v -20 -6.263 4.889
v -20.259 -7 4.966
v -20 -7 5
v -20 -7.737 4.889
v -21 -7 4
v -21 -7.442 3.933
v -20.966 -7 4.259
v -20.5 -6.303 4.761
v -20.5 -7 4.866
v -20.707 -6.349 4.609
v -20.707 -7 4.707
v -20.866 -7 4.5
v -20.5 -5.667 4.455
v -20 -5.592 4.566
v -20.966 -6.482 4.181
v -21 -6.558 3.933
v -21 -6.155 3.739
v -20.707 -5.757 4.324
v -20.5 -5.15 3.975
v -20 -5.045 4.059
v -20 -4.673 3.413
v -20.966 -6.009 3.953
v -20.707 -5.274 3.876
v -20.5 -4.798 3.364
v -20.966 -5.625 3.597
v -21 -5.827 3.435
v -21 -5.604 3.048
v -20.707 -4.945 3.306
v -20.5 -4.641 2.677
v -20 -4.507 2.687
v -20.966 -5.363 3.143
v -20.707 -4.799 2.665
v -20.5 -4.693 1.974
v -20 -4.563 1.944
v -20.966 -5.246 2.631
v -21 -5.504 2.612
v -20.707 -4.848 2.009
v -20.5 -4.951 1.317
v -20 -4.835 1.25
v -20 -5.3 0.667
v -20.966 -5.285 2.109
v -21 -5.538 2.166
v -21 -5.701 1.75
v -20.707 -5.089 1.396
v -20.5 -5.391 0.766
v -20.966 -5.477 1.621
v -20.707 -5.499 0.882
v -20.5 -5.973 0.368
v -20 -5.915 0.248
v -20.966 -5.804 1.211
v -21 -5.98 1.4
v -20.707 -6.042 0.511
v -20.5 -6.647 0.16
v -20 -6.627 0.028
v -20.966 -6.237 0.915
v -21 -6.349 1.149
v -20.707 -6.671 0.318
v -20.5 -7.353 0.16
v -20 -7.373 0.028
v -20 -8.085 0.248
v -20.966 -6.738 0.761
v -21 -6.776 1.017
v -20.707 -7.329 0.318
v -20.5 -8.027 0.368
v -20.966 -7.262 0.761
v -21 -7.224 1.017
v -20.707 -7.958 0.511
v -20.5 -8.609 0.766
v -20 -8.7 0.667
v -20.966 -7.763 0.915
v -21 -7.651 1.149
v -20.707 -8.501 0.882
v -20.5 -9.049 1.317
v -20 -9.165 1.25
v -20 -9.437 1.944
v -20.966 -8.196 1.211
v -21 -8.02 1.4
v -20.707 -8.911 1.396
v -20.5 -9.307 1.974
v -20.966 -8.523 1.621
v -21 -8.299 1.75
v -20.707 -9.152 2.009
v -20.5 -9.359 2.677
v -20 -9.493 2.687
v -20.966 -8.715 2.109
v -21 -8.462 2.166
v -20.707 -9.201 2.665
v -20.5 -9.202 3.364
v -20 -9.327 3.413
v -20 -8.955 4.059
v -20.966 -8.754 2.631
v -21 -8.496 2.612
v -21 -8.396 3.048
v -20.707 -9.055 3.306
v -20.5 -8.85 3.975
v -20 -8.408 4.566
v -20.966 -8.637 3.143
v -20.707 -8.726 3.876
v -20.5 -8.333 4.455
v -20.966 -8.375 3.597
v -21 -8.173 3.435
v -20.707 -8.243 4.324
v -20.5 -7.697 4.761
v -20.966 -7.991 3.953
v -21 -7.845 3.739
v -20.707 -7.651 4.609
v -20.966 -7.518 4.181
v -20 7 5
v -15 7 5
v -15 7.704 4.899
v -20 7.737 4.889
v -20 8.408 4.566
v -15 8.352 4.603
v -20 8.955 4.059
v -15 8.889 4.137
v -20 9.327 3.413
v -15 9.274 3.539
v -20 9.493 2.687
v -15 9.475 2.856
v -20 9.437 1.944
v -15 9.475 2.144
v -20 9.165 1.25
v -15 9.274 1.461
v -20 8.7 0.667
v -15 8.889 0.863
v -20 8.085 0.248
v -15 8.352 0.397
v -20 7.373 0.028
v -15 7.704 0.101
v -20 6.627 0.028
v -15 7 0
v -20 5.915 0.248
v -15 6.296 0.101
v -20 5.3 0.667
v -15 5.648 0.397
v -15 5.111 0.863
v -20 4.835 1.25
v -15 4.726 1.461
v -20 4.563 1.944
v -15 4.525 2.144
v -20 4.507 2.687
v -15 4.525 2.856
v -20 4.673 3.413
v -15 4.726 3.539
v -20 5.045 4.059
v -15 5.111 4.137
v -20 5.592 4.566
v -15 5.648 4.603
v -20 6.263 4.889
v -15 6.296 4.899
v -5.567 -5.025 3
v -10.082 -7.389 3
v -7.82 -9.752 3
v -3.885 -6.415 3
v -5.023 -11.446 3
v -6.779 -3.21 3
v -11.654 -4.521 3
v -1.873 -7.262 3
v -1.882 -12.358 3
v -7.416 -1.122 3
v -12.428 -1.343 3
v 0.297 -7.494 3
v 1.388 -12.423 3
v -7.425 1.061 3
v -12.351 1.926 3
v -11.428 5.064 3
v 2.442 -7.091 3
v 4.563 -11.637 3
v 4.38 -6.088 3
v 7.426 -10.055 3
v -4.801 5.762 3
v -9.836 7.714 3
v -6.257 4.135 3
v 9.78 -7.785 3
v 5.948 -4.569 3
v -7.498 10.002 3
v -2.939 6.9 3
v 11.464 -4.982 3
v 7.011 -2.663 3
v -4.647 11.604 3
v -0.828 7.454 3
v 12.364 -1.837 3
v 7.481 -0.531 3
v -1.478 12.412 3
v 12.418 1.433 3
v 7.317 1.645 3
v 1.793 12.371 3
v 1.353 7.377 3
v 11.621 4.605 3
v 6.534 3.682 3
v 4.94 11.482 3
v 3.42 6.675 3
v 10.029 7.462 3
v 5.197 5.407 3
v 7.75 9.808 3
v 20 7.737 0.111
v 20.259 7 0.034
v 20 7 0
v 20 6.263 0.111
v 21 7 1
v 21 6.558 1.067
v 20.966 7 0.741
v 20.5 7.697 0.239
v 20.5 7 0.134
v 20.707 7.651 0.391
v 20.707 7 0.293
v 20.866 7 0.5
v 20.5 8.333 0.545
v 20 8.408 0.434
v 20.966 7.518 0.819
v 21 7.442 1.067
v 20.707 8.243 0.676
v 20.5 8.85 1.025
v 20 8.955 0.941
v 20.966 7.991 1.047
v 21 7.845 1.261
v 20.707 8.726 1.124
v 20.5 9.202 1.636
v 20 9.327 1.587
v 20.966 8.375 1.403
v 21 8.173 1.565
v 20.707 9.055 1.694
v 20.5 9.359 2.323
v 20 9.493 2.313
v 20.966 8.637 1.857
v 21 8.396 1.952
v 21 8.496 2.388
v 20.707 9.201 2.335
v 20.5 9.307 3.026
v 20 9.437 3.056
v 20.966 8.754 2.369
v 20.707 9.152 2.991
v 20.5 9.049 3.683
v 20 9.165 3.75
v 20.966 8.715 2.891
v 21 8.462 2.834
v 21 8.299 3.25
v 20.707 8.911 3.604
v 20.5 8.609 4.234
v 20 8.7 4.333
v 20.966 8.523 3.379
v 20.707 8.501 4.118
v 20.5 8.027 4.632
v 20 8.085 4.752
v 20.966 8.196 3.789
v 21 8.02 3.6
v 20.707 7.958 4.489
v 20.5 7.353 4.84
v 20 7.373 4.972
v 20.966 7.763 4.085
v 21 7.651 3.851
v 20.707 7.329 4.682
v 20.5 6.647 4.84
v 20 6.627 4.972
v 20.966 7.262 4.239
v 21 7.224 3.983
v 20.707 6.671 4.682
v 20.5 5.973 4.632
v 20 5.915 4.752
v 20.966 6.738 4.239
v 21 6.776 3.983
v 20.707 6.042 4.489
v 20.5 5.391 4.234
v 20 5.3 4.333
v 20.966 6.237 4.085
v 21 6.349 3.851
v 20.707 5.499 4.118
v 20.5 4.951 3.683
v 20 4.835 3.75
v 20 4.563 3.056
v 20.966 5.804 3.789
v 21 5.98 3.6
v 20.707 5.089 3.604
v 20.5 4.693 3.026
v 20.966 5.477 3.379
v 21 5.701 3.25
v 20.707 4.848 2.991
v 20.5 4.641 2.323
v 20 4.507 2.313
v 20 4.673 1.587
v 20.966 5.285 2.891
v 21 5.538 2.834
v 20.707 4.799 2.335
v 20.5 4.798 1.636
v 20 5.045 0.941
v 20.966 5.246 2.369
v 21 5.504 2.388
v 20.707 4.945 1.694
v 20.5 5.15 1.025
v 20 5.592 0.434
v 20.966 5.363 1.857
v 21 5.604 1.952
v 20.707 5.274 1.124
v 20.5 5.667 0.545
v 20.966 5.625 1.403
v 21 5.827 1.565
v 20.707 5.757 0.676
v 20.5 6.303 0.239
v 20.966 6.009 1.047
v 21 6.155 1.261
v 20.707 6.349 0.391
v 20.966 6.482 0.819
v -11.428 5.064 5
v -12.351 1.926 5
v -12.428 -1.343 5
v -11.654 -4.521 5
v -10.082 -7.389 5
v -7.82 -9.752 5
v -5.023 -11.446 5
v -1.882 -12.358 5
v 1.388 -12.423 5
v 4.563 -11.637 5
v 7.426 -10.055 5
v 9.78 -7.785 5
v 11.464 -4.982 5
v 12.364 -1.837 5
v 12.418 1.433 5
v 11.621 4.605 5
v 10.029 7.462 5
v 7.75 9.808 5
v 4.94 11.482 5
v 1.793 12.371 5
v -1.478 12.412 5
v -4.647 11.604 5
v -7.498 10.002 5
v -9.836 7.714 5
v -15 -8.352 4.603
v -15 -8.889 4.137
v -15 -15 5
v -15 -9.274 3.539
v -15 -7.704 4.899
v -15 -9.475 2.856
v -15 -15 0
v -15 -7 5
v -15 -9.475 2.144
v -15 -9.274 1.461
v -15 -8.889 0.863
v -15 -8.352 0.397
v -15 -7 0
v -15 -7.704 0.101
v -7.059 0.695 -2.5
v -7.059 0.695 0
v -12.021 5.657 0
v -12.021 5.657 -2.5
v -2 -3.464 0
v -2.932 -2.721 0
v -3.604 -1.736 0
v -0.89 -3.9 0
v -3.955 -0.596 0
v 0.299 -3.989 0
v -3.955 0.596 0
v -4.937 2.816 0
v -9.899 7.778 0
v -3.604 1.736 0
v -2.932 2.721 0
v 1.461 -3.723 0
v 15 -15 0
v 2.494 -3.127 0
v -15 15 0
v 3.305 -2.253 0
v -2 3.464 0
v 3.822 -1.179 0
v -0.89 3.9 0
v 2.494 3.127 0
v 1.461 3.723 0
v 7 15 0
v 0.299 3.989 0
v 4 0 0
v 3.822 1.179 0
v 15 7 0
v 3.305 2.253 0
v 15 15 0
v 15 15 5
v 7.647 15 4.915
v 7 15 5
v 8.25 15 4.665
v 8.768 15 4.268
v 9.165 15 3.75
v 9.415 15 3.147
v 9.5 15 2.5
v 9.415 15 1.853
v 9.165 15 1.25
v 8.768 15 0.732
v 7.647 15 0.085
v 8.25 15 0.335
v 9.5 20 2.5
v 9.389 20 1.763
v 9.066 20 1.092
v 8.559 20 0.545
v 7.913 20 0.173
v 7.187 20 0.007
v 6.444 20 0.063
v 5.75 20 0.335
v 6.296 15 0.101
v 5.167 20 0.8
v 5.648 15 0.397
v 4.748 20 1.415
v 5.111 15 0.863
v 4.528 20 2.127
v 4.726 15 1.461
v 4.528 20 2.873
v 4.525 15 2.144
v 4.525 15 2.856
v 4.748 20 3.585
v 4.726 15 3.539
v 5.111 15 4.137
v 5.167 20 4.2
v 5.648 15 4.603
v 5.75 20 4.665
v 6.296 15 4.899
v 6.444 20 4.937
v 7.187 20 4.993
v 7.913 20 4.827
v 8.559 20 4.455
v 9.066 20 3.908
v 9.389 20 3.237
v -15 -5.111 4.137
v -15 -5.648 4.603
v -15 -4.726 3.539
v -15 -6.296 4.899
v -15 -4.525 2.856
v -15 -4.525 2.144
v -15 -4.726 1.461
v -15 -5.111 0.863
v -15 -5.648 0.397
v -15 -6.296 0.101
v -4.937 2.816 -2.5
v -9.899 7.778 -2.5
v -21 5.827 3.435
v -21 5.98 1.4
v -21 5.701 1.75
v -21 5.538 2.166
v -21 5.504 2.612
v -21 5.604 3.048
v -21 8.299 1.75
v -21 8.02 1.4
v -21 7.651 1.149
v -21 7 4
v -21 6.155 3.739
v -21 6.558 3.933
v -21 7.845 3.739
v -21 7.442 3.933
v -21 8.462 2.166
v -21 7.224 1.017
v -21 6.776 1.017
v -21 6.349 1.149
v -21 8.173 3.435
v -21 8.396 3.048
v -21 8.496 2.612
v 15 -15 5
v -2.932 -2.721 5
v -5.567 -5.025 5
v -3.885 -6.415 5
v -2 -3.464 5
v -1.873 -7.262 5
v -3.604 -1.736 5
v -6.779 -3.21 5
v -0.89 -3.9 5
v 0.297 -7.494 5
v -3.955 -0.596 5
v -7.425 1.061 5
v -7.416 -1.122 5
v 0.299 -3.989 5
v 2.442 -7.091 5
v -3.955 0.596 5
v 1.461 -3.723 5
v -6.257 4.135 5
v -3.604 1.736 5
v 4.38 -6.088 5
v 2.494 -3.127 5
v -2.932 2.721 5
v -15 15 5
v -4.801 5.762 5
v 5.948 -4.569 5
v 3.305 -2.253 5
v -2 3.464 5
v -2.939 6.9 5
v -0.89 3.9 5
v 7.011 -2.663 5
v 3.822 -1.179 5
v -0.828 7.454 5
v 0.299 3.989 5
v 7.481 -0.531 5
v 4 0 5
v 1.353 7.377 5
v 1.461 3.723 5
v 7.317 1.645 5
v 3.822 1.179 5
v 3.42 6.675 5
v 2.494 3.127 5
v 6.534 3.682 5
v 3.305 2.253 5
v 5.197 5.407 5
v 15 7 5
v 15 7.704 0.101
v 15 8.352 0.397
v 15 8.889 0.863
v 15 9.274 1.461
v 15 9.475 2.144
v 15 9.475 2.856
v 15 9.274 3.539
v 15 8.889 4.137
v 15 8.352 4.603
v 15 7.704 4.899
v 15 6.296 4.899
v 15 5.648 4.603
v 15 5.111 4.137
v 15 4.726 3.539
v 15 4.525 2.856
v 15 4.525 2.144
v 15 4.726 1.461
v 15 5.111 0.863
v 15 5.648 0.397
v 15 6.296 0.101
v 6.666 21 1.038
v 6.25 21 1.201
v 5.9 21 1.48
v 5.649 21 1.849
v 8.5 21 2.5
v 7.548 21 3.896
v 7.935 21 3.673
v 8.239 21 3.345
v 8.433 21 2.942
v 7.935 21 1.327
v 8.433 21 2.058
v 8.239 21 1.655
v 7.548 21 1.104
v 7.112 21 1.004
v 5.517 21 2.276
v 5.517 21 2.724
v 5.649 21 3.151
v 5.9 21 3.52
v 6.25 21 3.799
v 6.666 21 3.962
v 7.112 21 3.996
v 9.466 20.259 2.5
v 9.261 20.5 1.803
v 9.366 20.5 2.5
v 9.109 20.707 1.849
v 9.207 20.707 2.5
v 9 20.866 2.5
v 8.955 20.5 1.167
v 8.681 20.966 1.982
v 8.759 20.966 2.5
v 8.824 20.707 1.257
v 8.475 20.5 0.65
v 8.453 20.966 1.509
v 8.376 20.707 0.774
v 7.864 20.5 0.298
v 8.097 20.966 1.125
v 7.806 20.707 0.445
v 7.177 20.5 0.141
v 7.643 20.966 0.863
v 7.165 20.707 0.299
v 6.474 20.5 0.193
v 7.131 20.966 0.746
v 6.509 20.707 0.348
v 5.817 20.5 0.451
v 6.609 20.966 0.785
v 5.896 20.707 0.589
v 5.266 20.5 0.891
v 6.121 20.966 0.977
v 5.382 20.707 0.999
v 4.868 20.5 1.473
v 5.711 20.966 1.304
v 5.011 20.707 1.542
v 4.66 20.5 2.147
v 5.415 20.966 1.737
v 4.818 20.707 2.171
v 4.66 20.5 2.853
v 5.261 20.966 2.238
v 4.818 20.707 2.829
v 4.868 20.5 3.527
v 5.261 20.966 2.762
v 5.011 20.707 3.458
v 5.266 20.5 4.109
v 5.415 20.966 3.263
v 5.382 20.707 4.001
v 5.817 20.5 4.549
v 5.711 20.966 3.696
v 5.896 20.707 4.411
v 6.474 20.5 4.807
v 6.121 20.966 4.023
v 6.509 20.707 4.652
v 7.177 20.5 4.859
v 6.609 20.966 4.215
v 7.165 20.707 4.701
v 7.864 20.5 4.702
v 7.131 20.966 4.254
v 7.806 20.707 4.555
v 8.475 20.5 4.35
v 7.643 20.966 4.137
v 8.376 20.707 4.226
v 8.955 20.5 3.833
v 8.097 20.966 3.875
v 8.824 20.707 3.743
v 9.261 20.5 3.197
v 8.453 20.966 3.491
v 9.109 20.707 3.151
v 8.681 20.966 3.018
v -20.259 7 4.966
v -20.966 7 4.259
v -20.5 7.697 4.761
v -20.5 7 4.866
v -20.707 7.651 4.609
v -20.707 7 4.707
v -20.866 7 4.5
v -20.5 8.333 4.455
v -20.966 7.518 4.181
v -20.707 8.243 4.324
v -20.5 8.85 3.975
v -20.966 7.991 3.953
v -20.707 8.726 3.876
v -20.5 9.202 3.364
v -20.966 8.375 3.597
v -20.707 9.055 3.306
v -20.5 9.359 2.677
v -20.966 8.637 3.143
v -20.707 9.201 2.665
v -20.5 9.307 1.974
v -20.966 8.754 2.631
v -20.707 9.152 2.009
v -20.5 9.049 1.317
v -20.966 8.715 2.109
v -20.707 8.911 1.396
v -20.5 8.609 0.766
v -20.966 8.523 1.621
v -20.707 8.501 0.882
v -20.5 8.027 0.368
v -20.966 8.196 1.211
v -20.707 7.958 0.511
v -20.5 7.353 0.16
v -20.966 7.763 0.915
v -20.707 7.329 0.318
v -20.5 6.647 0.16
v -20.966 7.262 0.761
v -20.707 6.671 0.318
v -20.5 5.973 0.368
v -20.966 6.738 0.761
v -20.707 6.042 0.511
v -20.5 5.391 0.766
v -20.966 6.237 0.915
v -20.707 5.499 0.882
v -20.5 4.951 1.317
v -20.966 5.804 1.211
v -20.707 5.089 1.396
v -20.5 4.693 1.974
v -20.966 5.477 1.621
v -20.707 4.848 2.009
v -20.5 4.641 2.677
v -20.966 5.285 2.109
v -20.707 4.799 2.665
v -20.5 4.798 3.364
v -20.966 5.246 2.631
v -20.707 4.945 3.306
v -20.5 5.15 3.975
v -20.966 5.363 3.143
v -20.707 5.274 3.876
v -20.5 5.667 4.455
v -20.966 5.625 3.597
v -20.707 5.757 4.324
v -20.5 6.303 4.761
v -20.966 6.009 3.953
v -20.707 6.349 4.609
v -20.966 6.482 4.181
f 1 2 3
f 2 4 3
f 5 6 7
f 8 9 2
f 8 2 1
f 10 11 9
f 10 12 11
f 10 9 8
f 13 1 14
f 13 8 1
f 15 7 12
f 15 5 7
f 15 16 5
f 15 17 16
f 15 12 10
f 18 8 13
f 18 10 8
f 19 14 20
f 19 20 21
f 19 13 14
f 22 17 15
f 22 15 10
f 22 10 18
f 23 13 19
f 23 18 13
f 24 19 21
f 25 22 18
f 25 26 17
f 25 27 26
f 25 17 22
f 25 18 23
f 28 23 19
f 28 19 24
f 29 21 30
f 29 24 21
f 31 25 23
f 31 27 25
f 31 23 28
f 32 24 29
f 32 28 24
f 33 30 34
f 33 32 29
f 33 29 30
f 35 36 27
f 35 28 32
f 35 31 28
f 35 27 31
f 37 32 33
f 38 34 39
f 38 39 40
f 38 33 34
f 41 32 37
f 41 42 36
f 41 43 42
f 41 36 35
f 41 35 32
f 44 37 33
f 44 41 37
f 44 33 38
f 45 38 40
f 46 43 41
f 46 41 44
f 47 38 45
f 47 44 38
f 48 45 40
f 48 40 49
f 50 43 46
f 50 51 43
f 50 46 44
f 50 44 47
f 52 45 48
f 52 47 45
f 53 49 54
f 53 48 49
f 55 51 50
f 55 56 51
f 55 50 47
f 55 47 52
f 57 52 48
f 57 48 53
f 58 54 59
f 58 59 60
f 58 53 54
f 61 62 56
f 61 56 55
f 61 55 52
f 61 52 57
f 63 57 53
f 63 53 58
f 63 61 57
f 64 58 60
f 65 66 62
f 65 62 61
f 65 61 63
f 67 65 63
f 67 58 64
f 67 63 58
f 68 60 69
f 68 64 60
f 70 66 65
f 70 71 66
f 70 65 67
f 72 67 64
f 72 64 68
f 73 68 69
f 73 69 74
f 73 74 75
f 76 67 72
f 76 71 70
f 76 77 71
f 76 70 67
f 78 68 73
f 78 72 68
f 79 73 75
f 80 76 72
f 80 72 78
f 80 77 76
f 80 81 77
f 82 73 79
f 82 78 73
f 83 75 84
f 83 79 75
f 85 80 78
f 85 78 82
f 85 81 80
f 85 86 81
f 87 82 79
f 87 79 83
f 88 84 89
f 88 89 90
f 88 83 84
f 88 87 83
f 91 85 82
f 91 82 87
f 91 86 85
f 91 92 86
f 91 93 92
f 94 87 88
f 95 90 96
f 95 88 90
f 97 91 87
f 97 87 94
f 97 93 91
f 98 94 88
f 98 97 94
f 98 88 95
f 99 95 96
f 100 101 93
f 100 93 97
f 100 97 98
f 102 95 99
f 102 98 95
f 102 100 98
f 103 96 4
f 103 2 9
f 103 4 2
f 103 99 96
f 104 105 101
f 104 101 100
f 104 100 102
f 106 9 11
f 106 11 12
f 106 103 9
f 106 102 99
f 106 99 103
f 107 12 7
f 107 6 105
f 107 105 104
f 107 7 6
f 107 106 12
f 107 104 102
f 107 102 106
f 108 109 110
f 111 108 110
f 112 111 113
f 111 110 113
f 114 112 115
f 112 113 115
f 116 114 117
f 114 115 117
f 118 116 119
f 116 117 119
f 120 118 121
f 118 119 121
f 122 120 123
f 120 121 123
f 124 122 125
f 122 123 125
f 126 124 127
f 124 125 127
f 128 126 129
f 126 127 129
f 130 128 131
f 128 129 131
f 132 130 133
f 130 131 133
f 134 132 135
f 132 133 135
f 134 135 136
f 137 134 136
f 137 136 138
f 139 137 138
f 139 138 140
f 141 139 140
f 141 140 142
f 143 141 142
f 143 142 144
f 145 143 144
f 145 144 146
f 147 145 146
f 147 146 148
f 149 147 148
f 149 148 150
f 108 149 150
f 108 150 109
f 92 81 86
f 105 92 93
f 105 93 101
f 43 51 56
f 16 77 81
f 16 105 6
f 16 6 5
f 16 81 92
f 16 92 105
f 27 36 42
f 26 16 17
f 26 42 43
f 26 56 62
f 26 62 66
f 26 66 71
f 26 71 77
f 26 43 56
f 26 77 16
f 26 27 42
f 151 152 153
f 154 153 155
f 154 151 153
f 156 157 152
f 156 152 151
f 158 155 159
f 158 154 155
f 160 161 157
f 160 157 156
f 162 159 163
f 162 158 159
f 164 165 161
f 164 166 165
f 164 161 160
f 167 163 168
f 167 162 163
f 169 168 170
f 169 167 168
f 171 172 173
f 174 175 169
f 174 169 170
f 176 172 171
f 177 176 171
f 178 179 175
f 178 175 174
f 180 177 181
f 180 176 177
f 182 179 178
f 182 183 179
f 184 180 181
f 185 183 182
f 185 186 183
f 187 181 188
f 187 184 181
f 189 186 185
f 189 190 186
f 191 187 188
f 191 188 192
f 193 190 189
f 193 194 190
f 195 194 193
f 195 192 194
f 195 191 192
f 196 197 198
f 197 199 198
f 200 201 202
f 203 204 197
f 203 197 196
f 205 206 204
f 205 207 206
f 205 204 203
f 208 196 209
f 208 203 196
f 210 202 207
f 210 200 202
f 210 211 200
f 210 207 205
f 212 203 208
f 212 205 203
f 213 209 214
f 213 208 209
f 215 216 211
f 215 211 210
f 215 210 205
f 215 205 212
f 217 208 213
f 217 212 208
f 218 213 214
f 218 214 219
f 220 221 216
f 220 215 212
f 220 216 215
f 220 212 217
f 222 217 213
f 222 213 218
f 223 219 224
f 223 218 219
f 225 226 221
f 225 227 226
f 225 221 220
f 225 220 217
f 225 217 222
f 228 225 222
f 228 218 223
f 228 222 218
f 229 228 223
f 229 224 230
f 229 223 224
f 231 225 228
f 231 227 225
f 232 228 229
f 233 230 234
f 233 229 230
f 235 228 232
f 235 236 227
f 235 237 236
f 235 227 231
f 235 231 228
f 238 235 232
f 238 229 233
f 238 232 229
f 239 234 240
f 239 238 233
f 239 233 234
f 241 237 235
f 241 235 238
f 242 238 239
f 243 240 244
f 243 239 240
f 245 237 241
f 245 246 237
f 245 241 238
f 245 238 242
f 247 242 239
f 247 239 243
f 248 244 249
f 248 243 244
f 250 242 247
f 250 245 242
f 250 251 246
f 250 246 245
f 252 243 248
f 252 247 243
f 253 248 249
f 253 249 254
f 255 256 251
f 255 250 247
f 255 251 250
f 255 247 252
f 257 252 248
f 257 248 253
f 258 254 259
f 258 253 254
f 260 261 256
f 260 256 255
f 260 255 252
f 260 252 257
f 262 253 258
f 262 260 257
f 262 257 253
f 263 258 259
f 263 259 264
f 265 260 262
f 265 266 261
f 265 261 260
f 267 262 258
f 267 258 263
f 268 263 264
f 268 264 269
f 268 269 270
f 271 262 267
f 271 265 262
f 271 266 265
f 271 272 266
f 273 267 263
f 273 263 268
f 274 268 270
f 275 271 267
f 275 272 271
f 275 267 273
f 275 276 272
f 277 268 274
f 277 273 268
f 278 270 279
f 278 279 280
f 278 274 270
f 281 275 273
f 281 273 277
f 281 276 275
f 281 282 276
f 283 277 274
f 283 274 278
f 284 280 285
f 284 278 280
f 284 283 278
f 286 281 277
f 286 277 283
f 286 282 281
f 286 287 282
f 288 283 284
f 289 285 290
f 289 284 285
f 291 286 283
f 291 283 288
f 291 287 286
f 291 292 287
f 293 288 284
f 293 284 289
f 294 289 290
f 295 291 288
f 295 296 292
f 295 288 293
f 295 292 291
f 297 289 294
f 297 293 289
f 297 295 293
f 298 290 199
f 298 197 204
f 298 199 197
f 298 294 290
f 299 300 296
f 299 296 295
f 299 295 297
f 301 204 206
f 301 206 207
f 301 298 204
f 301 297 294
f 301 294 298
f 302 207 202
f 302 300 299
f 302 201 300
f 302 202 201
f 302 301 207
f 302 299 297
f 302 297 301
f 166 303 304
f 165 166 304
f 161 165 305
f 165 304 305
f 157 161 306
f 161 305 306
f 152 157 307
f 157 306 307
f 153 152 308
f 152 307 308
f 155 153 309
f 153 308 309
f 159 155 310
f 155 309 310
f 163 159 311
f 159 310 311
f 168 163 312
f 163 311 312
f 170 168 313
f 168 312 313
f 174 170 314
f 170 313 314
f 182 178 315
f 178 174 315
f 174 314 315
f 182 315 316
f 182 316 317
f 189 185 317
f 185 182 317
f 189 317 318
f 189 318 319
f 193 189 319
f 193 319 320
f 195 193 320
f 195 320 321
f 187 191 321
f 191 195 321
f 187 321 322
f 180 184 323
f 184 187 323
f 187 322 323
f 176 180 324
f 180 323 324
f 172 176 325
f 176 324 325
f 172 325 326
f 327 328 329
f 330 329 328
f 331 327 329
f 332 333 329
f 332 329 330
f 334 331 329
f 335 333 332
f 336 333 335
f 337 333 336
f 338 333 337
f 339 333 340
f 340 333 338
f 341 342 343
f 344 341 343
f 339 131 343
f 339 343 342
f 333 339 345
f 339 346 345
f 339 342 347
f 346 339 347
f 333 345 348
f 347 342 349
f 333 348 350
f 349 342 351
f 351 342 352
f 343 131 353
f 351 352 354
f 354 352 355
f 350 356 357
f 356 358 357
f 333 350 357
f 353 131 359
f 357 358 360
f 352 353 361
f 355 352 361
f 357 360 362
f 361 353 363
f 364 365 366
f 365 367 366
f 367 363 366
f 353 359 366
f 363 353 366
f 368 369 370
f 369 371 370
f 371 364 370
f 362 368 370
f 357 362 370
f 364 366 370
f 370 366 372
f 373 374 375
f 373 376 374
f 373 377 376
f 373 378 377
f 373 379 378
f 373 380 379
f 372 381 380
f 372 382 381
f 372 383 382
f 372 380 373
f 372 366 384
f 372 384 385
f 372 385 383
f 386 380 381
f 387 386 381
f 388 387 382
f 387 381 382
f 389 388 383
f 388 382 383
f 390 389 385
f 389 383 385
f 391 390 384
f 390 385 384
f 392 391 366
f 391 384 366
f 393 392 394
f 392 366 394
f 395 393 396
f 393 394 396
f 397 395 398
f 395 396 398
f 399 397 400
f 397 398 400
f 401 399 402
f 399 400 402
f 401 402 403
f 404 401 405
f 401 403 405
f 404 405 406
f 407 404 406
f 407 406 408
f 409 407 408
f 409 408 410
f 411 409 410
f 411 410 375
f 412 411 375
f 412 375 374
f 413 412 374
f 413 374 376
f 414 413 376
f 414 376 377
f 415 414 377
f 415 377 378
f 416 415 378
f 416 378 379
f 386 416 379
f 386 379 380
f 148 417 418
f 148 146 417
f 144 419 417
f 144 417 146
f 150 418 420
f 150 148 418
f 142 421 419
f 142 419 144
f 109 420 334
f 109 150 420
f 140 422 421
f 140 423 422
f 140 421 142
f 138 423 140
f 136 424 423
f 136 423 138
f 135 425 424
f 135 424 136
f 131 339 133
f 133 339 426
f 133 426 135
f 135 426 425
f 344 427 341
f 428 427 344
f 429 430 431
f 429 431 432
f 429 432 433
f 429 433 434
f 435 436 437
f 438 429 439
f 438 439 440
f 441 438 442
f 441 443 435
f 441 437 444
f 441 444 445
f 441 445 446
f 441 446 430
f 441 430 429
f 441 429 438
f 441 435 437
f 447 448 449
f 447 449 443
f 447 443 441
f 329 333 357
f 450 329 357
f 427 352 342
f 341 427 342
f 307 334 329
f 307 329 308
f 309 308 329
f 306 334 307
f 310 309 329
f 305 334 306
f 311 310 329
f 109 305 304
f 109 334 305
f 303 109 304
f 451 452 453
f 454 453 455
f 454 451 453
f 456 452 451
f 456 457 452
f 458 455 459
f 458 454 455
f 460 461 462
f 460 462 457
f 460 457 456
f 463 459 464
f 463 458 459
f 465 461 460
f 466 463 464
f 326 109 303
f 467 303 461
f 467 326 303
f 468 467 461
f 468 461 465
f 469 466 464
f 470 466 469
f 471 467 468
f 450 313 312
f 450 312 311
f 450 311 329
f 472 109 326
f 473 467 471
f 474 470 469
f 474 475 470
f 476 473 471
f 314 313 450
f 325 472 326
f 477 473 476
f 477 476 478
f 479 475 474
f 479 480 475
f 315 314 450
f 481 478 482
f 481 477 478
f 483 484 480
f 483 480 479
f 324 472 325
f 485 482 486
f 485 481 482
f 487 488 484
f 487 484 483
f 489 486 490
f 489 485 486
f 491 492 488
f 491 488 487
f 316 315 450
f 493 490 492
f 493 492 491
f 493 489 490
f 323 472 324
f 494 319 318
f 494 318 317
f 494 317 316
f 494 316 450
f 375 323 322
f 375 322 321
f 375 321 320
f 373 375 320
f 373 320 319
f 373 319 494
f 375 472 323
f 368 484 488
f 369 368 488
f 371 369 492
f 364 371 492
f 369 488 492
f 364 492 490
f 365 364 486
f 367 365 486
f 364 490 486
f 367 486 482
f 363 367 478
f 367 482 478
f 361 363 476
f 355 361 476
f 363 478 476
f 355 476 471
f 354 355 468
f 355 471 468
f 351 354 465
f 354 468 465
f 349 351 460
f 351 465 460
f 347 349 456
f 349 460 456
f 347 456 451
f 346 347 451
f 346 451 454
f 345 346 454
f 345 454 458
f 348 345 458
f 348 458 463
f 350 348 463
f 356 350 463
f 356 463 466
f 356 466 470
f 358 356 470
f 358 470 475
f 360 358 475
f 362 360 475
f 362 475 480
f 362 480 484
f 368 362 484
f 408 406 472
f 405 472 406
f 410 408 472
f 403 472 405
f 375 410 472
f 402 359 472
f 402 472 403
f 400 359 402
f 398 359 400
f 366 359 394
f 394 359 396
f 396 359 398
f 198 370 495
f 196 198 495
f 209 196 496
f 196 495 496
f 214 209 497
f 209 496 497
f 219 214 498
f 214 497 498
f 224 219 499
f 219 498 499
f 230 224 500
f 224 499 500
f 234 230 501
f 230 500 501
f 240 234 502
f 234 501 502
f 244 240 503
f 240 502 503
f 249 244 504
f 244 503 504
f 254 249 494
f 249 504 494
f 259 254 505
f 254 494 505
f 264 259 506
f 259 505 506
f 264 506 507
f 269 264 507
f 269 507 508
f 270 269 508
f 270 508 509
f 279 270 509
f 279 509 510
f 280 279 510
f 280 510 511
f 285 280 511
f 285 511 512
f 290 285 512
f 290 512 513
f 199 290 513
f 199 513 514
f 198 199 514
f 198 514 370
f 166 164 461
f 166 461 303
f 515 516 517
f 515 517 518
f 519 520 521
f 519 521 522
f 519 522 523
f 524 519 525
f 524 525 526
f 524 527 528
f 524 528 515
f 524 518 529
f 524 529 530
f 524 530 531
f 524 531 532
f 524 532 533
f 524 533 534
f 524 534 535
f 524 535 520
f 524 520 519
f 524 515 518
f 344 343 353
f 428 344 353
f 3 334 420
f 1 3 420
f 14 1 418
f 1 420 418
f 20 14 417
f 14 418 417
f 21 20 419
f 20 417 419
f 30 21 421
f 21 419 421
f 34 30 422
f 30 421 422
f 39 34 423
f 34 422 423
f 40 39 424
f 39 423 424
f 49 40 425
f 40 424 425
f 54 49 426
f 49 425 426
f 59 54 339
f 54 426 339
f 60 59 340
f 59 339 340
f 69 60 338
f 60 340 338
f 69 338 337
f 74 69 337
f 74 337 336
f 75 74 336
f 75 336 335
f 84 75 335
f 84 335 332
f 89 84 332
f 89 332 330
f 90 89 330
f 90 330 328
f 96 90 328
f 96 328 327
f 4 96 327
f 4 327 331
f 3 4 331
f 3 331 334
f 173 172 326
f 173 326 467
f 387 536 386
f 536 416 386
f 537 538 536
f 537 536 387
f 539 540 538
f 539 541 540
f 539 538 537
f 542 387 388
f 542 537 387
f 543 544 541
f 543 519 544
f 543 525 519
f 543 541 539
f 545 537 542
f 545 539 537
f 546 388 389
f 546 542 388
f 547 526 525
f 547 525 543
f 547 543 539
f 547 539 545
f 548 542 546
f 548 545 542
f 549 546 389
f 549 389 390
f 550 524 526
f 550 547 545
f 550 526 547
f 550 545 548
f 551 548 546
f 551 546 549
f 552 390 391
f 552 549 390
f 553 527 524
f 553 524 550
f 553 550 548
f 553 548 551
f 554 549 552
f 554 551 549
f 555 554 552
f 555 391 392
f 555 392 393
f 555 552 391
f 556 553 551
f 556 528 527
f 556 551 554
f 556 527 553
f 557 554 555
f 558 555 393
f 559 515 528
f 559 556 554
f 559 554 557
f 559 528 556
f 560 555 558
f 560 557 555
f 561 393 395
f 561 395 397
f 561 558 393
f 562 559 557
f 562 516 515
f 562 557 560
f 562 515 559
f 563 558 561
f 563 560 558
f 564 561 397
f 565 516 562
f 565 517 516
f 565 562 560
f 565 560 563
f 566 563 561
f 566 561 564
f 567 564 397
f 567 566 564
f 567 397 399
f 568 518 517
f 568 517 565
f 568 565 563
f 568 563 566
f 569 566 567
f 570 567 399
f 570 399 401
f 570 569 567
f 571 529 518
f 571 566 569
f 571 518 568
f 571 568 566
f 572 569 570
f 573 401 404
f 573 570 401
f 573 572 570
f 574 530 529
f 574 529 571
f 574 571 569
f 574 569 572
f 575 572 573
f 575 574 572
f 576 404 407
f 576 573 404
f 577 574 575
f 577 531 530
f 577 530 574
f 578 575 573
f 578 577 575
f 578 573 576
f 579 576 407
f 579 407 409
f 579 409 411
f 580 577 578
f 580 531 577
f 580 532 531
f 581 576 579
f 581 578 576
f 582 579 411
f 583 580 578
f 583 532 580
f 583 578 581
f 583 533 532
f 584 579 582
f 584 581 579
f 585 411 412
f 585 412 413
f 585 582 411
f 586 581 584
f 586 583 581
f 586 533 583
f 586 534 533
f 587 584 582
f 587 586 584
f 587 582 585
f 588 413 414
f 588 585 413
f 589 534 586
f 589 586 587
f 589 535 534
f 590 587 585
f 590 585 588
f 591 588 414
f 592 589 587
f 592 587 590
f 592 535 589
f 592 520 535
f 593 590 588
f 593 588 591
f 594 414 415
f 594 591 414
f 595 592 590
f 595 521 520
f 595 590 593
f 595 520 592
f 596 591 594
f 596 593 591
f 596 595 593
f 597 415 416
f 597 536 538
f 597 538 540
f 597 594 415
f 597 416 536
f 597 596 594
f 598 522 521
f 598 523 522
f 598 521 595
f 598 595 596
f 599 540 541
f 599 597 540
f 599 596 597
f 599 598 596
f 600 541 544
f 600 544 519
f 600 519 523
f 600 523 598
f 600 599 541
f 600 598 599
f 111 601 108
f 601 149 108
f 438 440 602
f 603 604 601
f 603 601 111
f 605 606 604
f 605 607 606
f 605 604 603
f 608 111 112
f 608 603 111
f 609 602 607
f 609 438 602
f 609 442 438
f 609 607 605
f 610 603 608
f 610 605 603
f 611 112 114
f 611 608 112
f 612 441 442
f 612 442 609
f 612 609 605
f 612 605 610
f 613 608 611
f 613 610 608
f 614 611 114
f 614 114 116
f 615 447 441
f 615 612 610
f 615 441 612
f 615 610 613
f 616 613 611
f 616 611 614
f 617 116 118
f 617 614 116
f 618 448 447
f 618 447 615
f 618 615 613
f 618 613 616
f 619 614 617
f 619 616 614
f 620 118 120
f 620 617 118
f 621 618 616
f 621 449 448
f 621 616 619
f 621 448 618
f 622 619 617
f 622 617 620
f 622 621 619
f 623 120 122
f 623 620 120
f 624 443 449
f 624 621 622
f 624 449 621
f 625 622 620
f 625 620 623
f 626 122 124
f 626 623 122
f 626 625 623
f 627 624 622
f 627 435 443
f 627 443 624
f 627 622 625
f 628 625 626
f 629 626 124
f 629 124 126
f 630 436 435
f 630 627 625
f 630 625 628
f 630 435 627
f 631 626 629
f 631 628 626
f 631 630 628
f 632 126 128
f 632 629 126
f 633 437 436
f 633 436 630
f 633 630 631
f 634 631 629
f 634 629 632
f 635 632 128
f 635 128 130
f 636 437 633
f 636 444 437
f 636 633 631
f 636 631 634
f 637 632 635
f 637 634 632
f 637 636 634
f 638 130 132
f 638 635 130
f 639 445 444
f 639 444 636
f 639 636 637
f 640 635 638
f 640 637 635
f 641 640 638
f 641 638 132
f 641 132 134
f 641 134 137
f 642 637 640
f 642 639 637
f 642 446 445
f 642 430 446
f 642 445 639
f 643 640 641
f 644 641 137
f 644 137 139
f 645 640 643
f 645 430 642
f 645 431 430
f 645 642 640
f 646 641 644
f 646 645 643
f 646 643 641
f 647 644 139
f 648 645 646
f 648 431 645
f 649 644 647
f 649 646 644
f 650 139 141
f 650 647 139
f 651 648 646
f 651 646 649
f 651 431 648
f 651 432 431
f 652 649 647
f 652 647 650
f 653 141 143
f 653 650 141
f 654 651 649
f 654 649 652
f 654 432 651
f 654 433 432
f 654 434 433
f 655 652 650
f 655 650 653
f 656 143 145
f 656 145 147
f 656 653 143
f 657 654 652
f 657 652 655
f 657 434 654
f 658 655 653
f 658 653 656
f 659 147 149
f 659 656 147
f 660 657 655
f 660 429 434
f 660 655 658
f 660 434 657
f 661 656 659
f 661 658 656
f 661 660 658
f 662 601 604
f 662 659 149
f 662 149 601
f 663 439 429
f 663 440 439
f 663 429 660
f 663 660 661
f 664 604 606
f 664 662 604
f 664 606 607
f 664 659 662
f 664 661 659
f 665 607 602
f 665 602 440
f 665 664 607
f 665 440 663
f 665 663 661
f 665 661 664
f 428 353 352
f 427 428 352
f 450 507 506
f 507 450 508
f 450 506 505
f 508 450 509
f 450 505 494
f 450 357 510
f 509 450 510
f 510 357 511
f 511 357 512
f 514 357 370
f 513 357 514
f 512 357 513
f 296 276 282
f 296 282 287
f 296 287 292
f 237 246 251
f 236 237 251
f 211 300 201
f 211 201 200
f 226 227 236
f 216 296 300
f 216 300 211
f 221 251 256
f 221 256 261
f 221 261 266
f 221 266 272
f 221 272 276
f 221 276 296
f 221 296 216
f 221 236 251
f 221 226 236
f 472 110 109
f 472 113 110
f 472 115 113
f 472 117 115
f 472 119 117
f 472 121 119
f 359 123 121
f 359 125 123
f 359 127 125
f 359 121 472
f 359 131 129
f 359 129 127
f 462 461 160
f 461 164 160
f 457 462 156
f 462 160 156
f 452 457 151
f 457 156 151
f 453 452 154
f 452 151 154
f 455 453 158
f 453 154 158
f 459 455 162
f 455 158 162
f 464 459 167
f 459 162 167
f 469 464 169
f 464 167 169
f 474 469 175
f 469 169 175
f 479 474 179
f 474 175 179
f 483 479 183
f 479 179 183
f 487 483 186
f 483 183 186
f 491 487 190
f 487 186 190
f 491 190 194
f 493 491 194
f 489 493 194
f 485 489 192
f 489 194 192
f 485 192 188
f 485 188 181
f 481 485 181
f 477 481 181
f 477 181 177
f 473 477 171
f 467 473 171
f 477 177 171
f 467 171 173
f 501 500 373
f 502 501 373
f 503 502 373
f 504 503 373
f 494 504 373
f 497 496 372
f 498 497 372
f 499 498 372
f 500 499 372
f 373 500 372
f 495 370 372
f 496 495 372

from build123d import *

# Parameters (mm, degrees)
ESQUISSE2_W              = 30
ESQUISSE2_H              = 30
BOSS_EXTRU_1_DEPTH       = 5
ESQUISSE16_R             = 2.5
BOSS_EXTRU_7_DEPTH       = 6
CONG_3_R                 = 1
ESQUISSE18_R             = 2.5
BOSS_EXTRU_9_DEPTH       = 6
CONG_5_R                 = 1
ESQUISSE8_R              = 12.5
ENL_V_MAT_EXTRU_1_DEPTH  = 2
ESQUISSE19_R             = 7.5
BOSS_EXTRU_10_DEPTH      = 2
ESQUISSE33_R             = 4
ENL_V_MAT_EXTRU_3_DEPTH  = 6
ESQUISSE35_R             = 2.5
BOSS_EXTRU_26_DEPTH      = 6
CONG_6_R                 = 1
BOSS_EXTRU_27_DEPTH      = 2
BOSS_EXTRU_27_DEPTH_BACK = 5.5


with BuildPart() as part:
    # Esquisse2 → Boss.-Extru.1 (new body)
    with BuildSketch(Plane.XY):
        Rectangle(ESQUISSE2_W, ESQUISSE2_H)
    extrude(amount=BOSS_EXTRU_1_DEPTH)

    # Esquisse16 → Boss.-Extru.7 (add)
    with BuildSketch(Plane.ZY.offset(15)):
        with Locations((2.5, 7)):
            Circle(ESQUISSE16_R)
        with Locations((2.5, -7)):
            Circle(ESQUISSE16_R)
    extrude(amount=BOSS_EXTRU_7_DEPTH)

    # Congé3
    cong_3_edges = [part.edges().sort_by_distance(p)[0] for p in [
        (-21, 7, 0),
        (-21, -7, 0),
    ]]
    fillet(cong_3_edges, radius=CONG_3_R)

    # Esquisse18 → Boss.-Extru.9 (add)
    with BuildSketch(Plane(origin=(15, 0, 0), x_dir=(0, 0, -1), z_dir=(1, 0, 0))):
        with Locations((-2.5, 7)):
            Circle(ESQUISSE18_R)
    extrude(amount=BOSS_EXTRU_9_DEPTH)

    # Congé5
    cong_5_edges = [part.edges().sort_by_distance(p)[0] for p in [
        (21, 7, 5),
    ]]
    fillet(cong_5_edges, radius=CONG_5_R)

    # Esquisse8 → Enlèv. mat.-Extru.1 (cut)
    with BuildSketch(Plane.XY.offset(5)):
        Circle(ESQUISSE8_R)
    extrude(amount=-ENL_V_MAT_EXTRU_1_DEPTH, mode=Mode.SUBTRACT)

    # Esquisse19 → Boss.-Extru.10 (add)
    with BuildSketch(Plane.XY.offset(3)):
        Circle(ESQUISSE19_R)
    extrude(amount=BOSS_EXTRU_10_DEPTH)

    # Esquisse33 → Enlèv. mat.-Extru.3 (cut, through all)
    with BuildSketch(Plane.XY.offset(5)):
        Circle(ESQUISSE33_R)
    extrude(amount=-ENL_V_MAT_EXTRU_3_DEPTH, mode=Mode.SUBTRACT)

    # Esquisse35 → Boss.-Extru.26 (add)
    with BuildSketch(Plane(origin=(0, 15, 0), x_dir=(1, 0, 0), z_dir=(0, 1, 0))):
        with Locations((7, -2.5)):
            Circle(ESQUISSE35_R)
    extrude(amount=BOSS_EXTRU_26_DEPTH)

    # Congé6
    cong_6_edges = [part.edges().sort_by_distance(p)[0] for p in [
        (4.5, 21, 2.5),
    ]]
    fillet(cong_6_edges, radius=CONG_6_R)

    # Esquisse31 → Boss.-Extru.27 (add, two sides)
    with BuildSketch(Plane.XY.offset(3)) as boss_extru_27_sk:
        Polygon((-12.02081528, 5.656854249), (-9.899494937, 7.778174593), (-4.937341349, 2.816021005), (-7.058661692, 0.694700662), align=None)
    extrude(amount=BOSS_EXTRU_27_DEPTH)
    extrude(boss_extru_27_sk.sketch, amount=-BOSS_EXTRU_27_DEPTH_BACK)


solid = part.part
